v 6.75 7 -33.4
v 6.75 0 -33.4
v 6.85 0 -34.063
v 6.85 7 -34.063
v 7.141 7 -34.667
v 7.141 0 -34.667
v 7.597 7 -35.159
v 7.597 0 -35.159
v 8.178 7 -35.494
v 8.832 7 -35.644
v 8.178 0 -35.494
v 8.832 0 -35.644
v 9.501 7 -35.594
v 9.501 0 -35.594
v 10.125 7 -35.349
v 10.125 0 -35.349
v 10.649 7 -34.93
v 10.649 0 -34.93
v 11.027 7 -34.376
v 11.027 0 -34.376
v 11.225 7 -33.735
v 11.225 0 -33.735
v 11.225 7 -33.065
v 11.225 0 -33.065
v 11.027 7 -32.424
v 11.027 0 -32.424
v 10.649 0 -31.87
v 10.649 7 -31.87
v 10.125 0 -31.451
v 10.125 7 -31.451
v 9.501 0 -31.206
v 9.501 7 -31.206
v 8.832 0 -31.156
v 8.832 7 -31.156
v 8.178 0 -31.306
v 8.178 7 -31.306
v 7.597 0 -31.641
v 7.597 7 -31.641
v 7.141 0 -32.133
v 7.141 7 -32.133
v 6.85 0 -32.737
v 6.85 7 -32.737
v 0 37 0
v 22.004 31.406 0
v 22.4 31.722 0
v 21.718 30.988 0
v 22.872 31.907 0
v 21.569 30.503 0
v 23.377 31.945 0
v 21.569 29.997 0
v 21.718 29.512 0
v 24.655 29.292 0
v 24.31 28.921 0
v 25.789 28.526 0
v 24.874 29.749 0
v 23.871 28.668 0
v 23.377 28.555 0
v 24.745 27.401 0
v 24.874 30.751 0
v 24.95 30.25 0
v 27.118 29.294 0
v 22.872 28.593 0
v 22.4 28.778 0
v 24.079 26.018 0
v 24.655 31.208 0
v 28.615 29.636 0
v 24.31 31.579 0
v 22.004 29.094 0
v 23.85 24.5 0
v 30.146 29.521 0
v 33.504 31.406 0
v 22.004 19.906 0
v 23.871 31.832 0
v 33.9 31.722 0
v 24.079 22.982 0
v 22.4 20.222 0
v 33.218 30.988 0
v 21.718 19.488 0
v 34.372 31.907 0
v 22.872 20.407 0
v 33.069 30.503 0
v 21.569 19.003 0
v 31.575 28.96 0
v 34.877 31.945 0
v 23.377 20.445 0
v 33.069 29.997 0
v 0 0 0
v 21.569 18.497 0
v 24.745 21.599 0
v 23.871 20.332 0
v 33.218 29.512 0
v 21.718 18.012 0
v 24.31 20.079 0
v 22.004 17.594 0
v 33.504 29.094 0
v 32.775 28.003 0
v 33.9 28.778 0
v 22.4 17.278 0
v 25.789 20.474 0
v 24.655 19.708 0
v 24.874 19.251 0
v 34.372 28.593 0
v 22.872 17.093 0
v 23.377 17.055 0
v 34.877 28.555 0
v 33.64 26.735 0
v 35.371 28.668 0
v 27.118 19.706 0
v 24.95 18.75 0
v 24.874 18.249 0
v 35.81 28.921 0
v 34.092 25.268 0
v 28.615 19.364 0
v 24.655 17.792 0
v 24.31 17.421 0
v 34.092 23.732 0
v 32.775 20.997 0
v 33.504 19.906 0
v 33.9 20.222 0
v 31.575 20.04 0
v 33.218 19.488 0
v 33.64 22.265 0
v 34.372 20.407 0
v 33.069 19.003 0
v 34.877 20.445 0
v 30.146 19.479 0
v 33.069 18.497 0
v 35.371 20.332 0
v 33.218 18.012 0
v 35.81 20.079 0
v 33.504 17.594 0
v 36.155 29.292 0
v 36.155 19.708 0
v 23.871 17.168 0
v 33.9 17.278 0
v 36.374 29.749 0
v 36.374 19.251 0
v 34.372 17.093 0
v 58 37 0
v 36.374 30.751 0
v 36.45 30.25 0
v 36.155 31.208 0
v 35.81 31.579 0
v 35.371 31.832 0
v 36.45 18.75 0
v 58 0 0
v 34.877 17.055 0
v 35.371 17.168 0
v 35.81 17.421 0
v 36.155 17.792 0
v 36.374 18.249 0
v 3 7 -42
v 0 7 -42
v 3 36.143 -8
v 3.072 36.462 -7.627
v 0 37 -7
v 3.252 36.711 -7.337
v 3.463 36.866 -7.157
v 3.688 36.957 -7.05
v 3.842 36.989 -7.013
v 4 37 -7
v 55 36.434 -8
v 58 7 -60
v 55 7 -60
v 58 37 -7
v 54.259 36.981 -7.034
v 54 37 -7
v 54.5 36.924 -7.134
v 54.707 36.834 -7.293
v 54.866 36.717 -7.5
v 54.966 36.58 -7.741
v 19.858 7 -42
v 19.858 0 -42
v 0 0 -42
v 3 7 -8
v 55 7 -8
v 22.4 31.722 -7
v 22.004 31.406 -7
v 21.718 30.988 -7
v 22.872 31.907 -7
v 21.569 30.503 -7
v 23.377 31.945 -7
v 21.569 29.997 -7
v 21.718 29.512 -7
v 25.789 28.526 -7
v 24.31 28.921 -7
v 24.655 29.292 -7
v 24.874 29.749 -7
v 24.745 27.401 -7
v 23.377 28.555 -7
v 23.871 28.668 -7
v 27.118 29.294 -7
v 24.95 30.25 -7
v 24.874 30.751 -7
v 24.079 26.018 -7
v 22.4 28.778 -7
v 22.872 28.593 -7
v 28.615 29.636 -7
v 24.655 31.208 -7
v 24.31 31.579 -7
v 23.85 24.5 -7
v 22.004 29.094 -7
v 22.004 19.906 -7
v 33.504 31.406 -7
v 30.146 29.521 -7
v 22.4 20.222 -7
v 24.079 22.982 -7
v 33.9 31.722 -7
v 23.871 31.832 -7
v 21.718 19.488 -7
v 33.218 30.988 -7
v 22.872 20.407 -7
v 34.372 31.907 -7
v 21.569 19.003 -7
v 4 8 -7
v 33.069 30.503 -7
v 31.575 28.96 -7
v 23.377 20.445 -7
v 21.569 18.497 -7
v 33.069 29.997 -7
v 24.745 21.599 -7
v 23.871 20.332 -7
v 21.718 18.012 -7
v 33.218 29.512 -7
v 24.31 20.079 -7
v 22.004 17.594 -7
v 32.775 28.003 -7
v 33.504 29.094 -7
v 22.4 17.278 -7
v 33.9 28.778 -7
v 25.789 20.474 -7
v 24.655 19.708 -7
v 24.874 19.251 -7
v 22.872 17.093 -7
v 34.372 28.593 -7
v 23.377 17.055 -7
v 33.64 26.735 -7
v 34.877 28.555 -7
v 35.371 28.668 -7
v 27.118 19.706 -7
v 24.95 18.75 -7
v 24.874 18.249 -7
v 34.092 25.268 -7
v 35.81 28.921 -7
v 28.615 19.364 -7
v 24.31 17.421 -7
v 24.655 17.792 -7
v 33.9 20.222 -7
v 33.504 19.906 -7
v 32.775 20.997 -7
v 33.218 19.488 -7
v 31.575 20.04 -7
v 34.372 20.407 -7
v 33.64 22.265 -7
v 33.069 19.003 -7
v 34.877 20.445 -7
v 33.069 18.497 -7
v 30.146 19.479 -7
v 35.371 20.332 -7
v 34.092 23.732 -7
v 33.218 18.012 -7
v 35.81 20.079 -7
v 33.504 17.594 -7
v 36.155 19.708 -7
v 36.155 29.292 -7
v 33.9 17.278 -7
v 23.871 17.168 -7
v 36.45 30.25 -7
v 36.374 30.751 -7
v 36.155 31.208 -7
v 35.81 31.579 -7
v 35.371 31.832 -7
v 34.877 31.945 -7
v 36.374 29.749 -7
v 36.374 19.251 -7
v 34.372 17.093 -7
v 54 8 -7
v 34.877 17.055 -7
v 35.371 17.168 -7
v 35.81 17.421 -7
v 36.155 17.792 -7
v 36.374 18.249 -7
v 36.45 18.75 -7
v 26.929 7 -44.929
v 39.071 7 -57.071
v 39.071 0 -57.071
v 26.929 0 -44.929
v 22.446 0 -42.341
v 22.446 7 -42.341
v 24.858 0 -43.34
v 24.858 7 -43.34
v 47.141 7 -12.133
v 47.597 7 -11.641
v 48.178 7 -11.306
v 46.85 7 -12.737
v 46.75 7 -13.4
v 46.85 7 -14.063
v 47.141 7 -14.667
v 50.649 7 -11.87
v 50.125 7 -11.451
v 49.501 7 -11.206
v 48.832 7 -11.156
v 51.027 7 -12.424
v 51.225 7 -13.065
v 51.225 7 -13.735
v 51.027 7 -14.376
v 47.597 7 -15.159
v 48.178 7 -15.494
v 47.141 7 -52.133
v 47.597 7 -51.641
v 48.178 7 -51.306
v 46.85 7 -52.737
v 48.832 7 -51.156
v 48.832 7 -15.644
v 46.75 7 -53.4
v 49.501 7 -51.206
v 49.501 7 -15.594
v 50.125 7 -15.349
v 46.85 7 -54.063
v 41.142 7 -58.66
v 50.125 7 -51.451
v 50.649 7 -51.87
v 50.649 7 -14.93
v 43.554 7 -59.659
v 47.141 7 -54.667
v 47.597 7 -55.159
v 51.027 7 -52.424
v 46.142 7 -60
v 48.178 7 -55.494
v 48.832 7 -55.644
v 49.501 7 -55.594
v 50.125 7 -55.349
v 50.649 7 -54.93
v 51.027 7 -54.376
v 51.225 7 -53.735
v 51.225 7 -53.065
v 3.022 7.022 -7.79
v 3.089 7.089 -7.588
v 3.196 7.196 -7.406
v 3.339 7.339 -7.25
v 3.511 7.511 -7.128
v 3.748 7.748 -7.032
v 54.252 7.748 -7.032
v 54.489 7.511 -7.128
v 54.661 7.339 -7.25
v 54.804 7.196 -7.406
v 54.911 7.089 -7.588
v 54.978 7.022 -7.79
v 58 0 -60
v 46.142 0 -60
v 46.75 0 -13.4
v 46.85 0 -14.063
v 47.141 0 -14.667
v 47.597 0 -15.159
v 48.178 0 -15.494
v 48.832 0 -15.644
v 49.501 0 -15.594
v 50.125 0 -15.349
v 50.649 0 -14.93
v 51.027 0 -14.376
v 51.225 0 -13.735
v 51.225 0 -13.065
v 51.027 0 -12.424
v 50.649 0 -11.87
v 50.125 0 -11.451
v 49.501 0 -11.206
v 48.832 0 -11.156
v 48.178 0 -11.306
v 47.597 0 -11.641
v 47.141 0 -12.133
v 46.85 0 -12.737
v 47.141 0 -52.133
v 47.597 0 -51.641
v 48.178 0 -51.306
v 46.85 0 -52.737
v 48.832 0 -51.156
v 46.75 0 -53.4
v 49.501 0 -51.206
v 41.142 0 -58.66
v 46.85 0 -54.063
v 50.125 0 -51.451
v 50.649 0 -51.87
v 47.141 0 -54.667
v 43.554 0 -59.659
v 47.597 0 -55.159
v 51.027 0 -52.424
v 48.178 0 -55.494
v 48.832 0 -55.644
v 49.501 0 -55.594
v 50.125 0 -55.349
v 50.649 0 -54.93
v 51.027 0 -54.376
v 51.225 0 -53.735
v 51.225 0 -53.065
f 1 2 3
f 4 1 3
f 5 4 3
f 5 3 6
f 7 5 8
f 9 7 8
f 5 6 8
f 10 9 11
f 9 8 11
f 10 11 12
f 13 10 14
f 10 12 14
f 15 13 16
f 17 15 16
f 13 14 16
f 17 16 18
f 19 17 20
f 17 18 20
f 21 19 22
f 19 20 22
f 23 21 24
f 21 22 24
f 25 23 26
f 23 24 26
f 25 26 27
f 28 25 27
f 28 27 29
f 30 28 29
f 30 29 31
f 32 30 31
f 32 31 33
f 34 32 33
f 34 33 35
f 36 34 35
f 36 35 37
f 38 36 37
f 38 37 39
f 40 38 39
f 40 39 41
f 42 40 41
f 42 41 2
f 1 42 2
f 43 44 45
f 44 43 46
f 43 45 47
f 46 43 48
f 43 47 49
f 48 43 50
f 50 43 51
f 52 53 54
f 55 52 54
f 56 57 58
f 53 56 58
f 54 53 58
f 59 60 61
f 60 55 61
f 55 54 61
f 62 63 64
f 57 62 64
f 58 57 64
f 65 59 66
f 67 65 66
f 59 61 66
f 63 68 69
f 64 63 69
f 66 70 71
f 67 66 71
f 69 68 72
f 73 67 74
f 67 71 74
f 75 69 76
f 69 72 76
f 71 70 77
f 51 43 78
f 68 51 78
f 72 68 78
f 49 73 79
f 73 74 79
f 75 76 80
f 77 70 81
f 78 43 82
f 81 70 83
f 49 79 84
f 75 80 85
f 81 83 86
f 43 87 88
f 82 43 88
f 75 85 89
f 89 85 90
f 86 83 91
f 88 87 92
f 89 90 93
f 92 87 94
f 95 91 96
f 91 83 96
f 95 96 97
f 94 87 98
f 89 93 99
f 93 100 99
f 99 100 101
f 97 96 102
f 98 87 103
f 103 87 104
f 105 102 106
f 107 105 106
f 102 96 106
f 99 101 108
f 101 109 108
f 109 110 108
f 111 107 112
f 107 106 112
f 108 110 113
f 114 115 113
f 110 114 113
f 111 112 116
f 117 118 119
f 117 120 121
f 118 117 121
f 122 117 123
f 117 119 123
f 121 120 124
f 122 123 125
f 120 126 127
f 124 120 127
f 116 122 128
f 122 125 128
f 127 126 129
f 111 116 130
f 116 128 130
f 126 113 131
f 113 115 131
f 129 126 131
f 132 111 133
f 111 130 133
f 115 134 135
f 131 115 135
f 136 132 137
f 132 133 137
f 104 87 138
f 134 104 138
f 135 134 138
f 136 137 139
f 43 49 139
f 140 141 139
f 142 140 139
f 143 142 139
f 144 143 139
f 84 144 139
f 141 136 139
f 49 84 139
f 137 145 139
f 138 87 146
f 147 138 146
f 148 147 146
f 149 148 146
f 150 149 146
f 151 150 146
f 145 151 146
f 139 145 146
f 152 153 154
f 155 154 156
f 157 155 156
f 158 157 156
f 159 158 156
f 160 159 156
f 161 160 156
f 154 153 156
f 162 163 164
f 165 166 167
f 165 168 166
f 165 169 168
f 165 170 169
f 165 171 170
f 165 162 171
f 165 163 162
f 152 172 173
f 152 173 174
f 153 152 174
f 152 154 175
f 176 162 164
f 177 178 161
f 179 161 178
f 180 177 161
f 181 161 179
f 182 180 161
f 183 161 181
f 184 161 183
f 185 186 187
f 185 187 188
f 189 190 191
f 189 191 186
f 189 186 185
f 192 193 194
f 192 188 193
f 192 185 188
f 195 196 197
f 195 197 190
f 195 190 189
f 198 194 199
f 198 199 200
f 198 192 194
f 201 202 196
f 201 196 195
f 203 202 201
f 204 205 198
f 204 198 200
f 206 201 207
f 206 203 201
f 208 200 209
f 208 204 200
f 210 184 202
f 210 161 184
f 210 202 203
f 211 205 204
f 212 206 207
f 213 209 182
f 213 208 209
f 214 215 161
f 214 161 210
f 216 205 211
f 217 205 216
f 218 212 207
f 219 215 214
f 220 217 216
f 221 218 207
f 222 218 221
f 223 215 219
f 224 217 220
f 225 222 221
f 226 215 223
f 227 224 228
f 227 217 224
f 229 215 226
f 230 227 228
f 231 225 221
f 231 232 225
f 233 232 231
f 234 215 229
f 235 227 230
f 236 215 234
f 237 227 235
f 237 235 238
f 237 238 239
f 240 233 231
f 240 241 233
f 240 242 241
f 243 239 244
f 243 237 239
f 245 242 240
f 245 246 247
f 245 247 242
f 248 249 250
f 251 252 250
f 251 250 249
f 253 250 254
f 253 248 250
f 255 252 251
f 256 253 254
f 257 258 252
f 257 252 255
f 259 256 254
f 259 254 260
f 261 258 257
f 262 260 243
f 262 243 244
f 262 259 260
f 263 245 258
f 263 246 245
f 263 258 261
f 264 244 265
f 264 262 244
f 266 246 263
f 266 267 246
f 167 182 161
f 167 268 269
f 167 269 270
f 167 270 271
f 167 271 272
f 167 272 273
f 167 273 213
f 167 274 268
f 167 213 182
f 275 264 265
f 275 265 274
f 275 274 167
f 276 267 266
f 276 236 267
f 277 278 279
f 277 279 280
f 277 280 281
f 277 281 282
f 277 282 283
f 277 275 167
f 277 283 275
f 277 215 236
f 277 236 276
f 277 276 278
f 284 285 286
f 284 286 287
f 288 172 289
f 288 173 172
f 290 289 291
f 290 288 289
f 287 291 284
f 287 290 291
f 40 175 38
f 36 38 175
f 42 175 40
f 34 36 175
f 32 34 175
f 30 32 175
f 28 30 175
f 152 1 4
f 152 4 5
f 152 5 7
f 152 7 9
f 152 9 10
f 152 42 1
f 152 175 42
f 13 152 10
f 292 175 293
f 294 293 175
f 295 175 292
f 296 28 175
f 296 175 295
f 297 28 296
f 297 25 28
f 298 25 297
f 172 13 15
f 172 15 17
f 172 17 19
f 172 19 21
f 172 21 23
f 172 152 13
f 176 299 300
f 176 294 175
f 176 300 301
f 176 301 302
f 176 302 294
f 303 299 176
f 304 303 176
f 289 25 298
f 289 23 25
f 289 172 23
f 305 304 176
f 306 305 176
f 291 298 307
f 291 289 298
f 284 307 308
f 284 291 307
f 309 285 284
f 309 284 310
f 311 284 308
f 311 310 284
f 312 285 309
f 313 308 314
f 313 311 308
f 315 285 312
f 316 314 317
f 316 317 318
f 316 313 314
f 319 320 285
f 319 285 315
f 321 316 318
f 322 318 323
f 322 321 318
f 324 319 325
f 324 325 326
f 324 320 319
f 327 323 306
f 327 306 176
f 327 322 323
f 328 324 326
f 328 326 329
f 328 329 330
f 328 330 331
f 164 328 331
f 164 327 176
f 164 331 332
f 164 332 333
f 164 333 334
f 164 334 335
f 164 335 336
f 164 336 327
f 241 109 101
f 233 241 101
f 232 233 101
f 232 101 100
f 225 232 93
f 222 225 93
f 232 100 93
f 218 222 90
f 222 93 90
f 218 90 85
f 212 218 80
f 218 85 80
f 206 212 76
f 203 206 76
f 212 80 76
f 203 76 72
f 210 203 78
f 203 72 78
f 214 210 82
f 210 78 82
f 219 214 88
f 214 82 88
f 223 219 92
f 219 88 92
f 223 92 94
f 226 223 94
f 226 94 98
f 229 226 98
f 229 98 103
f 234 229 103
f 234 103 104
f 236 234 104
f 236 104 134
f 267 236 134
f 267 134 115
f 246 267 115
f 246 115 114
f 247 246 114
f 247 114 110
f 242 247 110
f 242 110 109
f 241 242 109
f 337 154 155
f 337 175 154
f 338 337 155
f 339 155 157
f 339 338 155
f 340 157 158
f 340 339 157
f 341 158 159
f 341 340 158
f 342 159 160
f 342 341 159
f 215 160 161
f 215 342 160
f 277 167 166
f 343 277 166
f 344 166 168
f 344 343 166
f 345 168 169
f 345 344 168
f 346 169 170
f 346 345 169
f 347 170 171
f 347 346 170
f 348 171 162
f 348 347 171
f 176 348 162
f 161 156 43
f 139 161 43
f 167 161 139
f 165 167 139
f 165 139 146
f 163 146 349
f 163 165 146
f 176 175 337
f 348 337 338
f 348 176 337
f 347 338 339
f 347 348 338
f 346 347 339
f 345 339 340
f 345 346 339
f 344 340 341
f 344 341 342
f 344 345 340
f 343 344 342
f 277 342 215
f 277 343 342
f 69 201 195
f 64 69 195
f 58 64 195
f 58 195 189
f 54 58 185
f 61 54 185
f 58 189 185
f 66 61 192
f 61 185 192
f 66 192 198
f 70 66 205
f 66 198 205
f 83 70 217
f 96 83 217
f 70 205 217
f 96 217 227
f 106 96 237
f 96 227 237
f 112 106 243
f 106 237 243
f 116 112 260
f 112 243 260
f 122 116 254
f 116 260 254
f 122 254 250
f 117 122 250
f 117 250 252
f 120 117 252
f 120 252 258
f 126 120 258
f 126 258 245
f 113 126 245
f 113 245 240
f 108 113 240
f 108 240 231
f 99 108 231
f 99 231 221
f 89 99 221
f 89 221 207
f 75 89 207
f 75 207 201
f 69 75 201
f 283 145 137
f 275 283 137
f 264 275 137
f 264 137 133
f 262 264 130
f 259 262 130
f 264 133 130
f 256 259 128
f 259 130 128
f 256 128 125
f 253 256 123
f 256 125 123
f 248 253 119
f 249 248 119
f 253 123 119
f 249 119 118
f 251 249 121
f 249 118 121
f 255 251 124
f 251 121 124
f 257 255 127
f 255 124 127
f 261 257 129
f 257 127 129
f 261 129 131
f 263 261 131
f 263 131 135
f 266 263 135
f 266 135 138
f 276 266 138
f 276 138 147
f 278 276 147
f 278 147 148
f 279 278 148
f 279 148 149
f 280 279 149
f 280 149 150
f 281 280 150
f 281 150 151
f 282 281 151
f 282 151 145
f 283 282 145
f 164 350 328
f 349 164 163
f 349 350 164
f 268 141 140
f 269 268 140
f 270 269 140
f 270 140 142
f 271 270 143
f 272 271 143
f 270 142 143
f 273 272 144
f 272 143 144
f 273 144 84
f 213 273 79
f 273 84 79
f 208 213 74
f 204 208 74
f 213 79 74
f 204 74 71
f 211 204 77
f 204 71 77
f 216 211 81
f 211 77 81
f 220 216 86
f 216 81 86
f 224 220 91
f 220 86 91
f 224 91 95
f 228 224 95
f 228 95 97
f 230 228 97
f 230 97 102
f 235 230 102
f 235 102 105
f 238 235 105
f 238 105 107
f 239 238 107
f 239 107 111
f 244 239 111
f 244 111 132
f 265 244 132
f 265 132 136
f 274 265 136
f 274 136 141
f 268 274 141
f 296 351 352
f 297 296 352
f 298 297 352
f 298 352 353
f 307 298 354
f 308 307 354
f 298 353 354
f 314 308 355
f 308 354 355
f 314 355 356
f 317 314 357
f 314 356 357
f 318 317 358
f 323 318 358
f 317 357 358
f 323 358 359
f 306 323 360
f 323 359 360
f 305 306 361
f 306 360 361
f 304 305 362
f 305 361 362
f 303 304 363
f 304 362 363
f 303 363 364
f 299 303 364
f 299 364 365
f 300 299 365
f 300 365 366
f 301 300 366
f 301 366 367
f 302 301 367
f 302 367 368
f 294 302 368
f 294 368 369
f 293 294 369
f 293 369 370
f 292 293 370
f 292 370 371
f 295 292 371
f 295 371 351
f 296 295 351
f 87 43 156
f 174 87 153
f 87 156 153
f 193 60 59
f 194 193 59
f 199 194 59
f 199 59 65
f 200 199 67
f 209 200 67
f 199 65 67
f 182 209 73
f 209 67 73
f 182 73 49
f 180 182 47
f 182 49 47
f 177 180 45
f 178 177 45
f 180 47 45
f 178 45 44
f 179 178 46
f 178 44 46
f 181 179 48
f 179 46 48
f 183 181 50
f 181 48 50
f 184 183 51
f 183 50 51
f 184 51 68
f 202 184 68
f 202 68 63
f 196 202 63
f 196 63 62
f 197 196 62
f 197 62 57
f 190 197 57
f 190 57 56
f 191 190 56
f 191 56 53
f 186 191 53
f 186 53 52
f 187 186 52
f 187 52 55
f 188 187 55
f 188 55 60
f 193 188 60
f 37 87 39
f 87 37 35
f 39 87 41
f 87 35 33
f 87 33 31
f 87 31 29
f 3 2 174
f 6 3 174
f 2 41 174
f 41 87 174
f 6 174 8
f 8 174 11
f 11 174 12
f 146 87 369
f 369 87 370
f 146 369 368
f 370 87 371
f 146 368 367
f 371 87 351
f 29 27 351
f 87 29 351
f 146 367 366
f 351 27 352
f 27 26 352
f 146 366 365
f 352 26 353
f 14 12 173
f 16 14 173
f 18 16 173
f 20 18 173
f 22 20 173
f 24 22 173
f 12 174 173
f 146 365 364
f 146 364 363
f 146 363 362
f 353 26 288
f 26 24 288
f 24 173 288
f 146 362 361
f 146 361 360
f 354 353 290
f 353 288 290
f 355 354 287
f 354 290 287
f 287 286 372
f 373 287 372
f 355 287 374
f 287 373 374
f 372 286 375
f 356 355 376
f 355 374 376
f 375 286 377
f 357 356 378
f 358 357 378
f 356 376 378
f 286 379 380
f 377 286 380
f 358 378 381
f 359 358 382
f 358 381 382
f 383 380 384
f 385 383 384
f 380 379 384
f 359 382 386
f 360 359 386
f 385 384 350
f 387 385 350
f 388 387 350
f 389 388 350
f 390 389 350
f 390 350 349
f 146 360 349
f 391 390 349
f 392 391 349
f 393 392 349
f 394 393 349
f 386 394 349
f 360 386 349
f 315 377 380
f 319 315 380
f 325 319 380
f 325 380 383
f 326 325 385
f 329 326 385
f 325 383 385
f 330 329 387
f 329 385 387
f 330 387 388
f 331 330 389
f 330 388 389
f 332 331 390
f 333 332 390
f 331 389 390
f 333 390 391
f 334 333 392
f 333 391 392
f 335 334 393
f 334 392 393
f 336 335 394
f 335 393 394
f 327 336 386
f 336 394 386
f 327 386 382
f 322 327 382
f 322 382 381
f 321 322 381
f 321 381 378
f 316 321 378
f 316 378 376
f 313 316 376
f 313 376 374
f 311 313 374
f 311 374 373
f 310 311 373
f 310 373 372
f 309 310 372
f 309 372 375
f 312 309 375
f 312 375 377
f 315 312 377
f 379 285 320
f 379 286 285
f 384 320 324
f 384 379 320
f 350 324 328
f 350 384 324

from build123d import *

# Parameters (mm, degrees)
SKETCH1_W            = 58
SKETCH1_H            = 60
BOSS_EXTRUDE1_DEPTH  = 7
SKETCH2_W            = 58
SKETCH2_H            = 7
BOSS_EXTRUDE2_DEPTH  = 30
SKETCH5_R            = 5.15
CUT_EXTRUDE1_DEPTH   = 87.844688957
M3_CLEARANCE_HOLE1_D = 3.4
SUPPORT_DEPTH        = 3
M4_CLEARANCE_HOLE2_D = 4.5
CUT_EXTRUDE5_DEPTH   = 89.67919711
BOSS_EXTRUDE6_DEPTH  = 3
FILLET2_R            = 10
FILLET3_R            = 1


with BuildPart() as part:
    # Sketch1 → Boss-Extrude1 (new body)
    with BuildSketch(Plane(origin=(0, 0, 0), x_dir=(1, 0, 0), z_dir=(0, 1, 0))):
        with Locations((29, 30)):
            Rectangle(SKETCH1_W, SKETCH1_H)
    extrude(amount=BOSS_EXTRUDE1_DEPTH)

    # Sketch2 → Boss-Extrude2 (add)
    with BuildSketch(Plane(origin=(0, 7, 0), x_dir=(1, 0, 0), z_dir=(0, 1, 0))):
        with Locations((29, 3.5)):
            Rectangle(SKETCH2_W, SKETCH2_H)
    extrude(amount=BOSS_EXTRUDE2_DEPTH)

    # Sketch5 → Cut-Extrude1 (cut, through all)
    with BuildSketch(Plane(origin=(0, 0, -7), x_dir=(-1, 0, 0), z_dir=(0, 0, -1))):
        with Locations((-29, 24.5)):
            Circle(SKETCH5_R)
    extrude(amount=-CUT_EXTRUDE1_DEPTH, mode=Mode.SUBTRACT)

    # M3 Clearance Hole1 (through all)
    with Locations(Plane(origin=(0, 0, -7), x_dir=(-1, 0, 0), z_dir=(0, 0, -1))):
        with Locations((-34.75, 18.75), (-23.25, 18.75), (-23.25, 30.25), (-34.75, 30.25)):
            Hole(M3_CLEARANCE_HOLE1_D / 2)

    # Sketch15 → support (add)
    with BuildSketch(Plane(origin=(58, 0, 0), x_dir=(0, 0, -1), z_dir=(1, 0, 0))):
        Polygon((60, 7), (7, 37), (7, 7), align=None)
    extrude(amount=-SUPPORT_DEPTH)

    # M4 Clearance Hole2 (through all)
    with Locations(Plane(origin=(0, 7, 0), x_dir=(1, 0, 0), z_dir=(0, 1, 0))):
        with Locations((49, 53.4), (49, 13.4), (9, 33.4)):
            Hole(M4_CLEARANCE_HOLE2_D / 2)

    # Sketch21 → Cut-Extrude5 (cut, through all)
    with BuildSketch(Plane(origin=(0, 7, 0), x_dir=(1, 0, 0), z_dir=(0, 1, 0))):
        Polygon((42, 60), (24, 42), (0, 42), (0, 60), align=None)
    extrude(amount=-CUT_EXTRUDE5_DEPTH, mode=Mode.SUBTRACT)

    # Sketch22 → Boss-Extrude6 (add)
    with BuildSketch(Plane.ZY):
        Polygon((-42, 7), (-7, 37), (-7, 7), align=None)
    extrude(amount=-BOSS_EXTRUDE6_DEPTH)

    # Fillet2
    fillet2_edges = [part.edges().sort_by_distance(p)[0] for p in [
        (42, 3.5, -60),
        (24, 3.5, -42),
    ]]
    fillet(fillet2_edges, radius=FILLET2_R)

    # Fillet3
    fillet3_edges = [part.edges().sort_by_distance(p)[0] for p in [
        (29, 7, -7),
        (55, 22, -7),
        (3, 22, -7),
    ]]
    fillet(fillet3_edges, radius=FILLET3_R)


solid = part.part
